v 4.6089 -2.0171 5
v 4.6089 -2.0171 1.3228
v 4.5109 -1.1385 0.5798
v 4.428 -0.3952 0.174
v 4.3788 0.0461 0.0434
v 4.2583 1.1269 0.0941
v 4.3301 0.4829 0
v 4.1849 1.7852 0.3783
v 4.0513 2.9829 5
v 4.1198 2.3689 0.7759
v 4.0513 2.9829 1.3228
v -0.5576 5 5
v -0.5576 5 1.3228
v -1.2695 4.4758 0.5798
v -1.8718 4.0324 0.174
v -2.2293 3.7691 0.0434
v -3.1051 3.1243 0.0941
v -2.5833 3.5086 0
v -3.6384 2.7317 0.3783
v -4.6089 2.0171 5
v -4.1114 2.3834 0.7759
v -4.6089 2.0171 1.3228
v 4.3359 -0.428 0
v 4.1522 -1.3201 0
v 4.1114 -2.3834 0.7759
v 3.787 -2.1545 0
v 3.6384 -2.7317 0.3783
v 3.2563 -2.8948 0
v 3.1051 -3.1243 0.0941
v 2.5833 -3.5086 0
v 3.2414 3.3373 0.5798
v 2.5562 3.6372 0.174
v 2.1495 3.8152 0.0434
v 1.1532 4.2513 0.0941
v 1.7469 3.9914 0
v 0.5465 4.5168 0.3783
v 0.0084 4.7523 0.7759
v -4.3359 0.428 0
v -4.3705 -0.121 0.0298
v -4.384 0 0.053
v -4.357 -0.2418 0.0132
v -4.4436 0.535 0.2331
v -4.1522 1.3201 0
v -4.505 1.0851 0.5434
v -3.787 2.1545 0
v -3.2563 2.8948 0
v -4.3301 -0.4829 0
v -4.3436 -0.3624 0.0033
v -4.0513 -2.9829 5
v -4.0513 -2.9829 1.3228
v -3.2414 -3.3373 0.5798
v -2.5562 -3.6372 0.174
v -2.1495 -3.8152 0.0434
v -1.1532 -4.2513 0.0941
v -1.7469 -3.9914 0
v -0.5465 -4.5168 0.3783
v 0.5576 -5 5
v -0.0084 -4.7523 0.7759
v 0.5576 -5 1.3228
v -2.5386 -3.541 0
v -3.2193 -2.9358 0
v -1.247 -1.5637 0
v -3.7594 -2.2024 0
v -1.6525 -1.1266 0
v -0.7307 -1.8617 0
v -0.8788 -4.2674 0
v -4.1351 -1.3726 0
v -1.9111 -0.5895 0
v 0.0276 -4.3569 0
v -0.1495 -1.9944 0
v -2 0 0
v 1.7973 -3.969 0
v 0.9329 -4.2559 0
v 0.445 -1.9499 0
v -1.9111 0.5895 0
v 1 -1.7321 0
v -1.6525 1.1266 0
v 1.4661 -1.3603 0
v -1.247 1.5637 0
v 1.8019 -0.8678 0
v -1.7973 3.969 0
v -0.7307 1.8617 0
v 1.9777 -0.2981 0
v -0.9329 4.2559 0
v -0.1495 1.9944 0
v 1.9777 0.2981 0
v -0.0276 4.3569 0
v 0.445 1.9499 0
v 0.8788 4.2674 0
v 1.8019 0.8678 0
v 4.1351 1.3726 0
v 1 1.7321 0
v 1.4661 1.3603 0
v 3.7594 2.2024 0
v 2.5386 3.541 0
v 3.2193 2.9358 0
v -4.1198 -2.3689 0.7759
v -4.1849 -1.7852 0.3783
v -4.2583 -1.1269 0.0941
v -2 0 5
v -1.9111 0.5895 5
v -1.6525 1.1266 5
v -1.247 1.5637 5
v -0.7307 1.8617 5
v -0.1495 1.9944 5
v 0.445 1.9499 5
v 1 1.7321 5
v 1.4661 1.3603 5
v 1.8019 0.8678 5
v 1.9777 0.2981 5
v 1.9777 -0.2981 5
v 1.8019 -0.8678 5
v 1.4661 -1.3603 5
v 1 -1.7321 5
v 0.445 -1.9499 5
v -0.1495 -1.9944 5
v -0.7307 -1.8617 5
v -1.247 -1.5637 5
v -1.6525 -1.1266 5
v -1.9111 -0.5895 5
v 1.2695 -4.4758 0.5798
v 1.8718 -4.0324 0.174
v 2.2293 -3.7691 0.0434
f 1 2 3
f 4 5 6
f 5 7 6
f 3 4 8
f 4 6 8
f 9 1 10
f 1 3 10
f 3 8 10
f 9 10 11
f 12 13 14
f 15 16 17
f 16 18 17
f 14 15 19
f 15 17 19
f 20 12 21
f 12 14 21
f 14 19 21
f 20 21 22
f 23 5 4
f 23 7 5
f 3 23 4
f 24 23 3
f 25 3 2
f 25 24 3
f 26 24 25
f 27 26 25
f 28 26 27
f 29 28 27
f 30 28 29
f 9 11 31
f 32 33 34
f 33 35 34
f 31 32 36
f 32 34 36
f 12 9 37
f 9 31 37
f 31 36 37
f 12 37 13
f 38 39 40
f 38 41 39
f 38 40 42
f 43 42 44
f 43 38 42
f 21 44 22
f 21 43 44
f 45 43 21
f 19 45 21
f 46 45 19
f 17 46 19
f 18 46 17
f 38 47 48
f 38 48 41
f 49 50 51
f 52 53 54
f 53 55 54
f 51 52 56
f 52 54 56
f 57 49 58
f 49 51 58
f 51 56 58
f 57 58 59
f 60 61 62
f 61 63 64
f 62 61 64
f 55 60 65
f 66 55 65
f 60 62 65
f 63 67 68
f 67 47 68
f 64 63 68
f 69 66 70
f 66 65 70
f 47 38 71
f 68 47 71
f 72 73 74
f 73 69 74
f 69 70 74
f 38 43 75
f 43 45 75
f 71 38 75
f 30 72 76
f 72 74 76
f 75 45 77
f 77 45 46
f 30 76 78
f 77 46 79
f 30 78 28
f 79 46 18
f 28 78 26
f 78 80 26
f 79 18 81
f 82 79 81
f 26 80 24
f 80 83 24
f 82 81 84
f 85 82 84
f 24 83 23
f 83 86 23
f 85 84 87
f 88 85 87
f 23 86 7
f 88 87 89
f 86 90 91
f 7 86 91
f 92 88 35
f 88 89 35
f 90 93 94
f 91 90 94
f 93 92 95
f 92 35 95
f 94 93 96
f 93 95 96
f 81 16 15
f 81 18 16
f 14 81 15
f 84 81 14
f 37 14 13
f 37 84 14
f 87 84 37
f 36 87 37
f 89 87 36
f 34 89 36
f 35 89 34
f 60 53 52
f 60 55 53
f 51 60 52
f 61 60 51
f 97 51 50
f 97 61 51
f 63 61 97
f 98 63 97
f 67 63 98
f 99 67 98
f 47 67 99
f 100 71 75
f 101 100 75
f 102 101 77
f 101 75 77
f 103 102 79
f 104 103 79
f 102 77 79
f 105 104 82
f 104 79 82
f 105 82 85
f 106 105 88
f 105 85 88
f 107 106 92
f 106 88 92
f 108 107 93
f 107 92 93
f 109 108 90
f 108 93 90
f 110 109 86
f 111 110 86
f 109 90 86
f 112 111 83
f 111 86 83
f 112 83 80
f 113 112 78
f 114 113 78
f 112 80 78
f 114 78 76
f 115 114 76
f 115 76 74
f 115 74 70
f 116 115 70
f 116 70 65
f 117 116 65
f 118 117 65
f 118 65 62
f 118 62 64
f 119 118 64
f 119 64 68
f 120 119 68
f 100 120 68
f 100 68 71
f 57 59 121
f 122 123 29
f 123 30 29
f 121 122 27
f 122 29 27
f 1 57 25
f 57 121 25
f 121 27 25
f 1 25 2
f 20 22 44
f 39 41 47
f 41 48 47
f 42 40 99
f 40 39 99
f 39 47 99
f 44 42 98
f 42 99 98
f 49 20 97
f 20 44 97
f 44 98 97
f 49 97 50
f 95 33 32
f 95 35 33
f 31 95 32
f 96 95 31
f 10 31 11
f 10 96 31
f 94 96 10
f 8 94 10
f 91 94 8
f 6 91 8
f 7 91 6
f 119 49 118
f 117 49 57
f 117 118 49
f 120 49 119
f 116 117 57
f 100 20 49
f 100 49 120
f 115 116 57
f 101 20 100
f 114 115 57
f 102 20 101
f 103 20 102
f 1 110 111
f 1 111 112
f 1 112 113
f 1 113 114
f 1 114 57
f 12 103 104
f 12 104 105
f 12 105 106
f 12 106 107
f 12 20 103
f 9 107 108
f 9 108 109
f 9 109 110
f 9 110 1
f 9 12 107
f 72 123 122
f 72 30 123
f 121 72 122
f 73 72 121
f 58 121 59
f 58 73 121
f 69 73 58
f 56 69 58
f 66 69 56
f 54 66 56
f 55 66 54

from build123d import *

# Parameters (mm, degrees)
BOSS_EXTRUDE2_DEPTH = 5
SKETCH2_R           = 2
CUT_EXTRUDE1_DEPTH  = 9.440506234
SKETCH3_OUTSIDE_W   = 19.212
SKETCH3_OUTSIDE_H   = 19.994
SKETCH3_OUTSIDE_R   = 4.356968777
CUT_EXTRUDE2_DEPTH  = 5
CUT_EXTRUDE2_DRAFT  = -27


with BuildPart() as part:
    # Sketch1 → Boss-Extrude2 (new body)
    with BuildSketch(Plane.XY):
        Polygon((4.608920208, -2.017116032), (4.05133383, 2.982883968), (-0.557586378, 5), (-4.608920208, 2.017116032), (-4.05133383, -2.982883968), (0.557586378, -5), align=None)
    extrude(amount=BOSS_EXTRUDE2_DEPTH)

    # Sketch2 → Cut-Extrude1 (cut, through all)
    with BuildSketch(Plane(origin=(0, 0, 0), x_dir=(-1, 0, 0), z_dir=(0, 0, -1))):
        Circle(SKETCH2_R)
    extrude(amount=-CUT_EXTRUDE1_DEPTH, mode=Mode.SUBTRACT)


with BuildPart() as cut_extrude2_tool:
    # Sketch3 outside → Cut-Extrude2 (with draft: the straight prism first)
    with BuildSketch(Plane(origin=(0, 0, 0), x_dir=(-1, 0, 0), z_dir=(0, 0, -1))):
        Rectangle(SKETCH3_OUTSIDE_W, SKETCH3_OUTSIDE_H)
        Circle(SKETCH3_OUTSIDE_R, mode=Mode.SUBTRACT)
    extrude(amount=-CUT_EXTRUDE2_DEPTH)
    # Cut-Extrude2: the draft: its side faces are tilted about the plane it starts from
    cut_extrude2_sides = [cut_extrude2_tool.faces().sort_by_distance(p)[0] for p in [
        (0, -9.997, 2.5),
        (-9.606, 0, 2.5),
        (0, 9.997, 2.5),
        (9.606, 0, 2.5),
        (4.356968777, 0, 2.5),
    ]]
    draft(cut_extrude2_sides, Plane(origin=(0, 0, 0), x_dir=(-1, 0, 0), z_dir=(0, 0, -1)), CUT_EXTRUDE2_DRAFT)


with BuildPart() as part_1:
    add(part.part)

    # Cut-Extrude2: cut by cut_extrude2_tool
    add(cut_extrude2_tool.part, mode=Mode.SUBTRACT)


solid = part_1.part
